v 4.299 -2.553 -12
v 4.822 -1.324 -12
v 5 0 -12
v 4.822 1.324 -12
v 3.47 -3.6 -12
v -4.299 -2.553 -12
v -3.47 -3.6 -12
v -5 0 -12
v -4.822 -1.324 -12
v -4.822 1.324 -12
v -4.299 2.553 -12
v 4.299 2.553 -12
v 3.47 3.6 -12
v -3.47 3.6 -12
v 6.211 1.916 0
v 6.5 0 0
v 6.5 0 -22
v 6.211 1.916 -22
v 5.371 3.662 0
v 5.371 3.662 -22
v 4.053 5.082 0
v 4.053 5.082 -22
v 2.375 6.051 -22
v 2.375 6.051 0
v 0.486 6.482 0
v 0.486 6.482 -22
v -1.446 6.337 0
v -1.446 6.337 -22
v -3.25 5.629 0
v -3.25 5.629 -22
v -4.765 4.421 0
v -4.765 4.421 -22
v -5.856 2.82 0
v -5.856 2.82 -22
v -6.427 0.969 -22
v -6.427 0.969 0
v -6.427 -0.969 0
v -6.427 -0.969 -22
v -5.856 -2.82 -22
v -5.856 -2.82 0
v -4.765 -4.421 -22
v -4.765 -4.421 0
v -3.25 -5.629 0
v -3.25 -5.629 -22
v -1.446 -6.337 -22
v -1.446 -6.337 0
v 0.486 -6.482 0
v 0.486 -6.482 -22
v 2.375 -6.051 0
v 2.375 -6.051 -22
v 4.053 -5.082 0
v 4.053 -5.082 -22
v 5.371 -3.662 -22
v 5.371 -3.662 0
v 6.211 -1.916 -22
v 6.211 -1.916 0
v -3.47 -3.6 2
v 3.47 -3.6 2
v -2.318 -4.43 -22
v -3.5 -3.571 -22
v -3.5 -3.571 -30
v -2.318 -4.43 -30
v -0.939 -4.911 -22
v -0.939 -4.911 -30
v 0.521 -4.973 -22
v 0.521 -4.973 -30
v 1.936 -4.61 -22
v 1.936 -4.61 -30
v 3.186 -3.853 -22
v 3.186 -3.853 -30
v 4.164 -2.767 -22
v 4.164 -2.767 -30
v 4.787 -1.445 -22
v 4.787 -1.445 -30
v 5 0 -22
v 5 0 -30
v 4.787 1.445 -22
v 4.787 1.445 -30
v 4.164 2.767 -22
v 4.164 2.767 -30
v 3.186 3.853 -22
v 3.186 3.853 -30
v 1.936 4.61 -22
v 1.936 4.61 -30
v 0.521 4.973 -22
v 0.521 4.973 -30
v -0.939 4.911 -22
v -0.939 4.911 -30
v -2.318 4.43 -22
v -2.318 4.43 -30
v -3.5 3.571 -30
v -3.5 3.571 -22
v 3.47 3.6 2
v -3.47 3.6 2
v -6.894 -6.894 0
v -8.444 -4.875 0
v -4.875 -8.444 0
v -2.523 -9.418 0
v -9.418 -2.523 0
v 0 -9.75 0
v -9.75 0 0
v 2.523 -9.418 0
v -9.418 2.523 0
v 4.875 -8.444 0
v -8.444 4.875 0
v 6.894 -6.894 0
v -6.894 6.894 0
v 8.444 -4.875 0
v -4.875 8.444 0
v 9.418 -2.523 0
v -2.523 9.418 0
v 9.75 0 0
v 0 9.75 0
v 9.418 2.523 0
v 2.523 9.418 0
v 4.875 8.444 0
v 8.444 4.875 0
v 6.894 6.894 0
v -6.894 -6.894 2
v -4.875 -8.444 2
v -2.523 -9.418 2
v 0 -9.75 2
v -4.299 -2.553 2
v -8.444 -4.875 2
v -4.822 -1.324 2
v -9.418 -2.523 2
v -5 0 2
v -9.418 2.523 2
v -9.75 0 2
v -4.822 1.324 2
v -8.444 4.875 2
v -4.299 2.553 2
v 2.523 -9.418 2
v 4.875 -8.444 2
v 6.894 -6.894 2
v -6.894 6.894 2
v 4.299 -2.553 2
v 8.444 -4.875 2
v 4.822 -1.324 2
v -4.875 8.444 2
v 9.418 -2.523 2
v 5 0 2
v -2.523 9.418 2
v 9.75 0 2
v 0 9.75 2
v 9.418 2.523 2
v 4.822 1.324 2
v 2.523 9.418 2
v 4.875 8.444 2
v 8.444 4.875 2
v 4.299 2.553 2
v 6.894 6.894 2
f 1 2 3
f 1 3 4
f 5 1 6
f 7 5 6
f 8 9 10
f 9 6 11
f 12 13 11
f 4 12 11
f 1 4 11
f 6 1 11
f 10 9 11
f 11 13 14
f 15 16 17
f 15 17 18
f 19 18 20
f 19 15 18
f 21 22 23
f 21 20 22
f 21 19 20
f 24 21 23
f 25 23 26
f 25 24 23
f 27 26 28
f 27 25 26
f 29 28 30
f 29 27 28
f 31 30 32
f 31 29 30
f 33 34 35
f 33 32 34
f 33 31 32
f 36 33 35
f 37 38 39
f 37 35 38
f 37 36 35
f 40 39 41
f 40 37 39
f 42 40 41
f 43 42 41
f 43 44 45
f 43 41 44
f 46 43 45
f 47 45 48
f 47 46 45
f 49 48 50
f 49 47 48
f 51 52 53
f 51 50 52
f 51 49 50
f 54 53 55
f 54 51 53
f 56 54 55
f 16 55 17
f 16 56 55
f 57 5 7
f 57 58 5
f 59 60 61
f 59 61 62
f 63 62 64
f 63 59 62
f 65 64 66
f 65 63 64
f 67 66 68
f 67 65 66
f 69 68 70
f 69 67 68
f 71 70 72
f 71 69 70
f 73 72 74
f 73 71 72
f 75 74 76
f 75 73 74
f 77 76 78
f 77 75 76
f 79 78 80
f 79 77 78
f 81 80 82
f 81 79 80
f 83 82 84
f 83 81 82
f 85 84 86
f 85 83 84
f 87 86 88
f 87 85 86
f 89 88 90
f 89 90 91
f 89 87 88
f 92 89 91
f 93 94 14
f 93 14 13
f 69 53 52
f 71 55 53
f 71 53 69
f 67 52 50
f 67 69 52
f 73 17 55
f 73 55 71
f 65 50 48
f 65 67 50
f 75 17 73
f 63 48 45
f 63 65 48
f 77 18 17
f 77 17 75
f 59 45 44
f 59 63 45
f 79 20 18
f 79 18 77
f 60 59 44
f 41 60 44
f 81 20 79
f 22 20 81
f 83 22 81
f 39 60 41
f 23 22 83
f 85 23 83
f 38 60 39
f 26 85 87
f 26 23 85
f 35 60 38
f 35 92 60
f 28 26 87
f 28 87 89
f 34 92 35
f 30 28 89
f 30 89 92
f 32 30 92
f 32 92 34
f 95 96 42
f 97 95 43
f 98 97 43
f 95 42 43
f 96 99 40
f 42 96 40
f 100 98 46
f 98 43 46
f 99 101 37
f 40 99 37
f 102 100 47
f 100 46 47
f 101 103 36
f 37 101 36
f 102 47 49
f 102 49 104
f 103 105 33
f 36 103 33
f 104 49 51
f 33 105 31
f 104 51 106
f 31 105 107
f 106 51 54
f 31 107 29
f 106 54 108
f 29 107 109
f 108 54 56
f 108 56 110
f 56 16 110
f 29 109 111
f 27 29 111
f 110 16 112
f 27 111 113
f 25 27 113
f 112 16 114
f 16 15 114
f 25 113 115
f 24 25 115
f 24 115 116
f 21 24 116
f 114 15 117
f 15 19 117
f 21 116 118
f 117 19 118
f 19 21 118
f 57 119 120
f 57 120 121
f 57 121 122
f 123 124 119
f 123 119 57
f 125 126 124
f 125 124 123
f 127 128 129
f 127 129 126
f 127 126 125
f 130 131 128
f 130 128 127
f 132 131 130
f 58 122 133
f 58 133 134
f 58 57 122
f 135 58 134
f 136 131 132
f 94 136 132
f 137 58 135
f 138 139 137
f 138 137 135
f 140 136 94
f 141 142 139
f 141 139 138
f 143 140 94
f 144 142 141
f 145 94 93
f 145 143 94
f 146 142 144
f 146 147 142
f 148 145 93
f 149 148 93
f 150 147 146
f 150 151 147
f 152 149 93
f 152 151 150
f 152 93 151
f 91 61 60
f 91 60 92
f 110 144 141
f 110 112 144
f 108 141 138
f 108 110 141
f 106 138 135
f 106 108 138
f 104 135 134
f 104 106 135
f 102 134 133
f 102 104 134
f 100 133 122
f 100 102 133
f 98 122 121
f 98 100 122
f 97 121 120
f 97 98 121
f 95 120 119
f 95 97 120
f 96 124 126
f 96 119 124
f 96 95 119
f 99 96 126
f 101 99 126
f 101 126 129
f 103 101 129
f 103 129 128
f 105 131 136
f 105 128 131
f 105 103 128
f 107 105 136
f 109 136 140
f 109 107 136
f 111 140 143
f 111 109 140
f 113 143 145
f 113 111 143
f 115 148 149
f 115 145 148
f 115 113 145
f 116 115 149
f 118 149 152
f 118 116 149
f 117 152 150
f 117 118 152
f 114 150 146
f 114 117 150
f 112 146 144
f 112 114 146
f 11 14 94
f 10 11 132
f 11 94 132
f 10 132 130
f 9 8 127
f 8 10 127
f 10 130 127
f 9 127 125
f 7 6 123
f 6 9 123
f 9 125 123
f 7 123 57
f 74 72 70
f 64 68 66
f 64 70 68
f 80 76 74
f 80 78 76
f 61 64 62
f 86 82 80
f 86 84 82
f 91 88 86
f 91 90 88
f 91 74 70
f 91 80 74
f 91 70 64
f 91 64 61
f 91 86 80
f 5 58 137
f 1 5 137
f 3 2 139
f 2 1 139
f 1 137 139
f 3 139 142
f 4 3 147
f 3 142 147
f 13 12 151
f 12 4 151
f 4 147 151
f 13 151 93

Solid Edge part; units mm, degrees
sketch "Sketch1" plane through (0, 0, 0) normal (0, 0, 1) x (1, 0, 0)
  circle A0 centre (0, 0) radius 9.75
  dimension "D1" = 19.5
extrude "Protrusion1" add sketch "Sketch1" along normal blind 2
sketch "Sketch2" plane through (0, 0, 0) normal (0, 0, -1) x (1, 0, 0)
  circle A0 centre (0, 0) radius 6.5
  dimension "D1" = 13
extrude "Protrusion2" add sketch "Sketch2" along normal blind 22
sketch "Sketch3" plane through (0, 0, -22) normal (0, 0, -1) x (1, 0, 0)
  line L0 (-3.5, 3.5707) -> (-3.5, -3.5707)
  arc A0 (-3.5, 3.5707) -> (-3.5, -3.5707) centre (0, 0) cw
  dimension "D1" = 10
  dimension "D2" = 3.5
extrude "Protrusion3" add sketch "Sketch3" along normal blind 8
sketch "Sketch4" plane through (0, 0, 2) normal (0, 0, 1) x (1, 0, 0)
  line L0 (-3.4699, 3.6) -> (3.4699, 3.6)
  arc A0 (3.4699, 3.6) -> (3.4699, -3.6) centre (0, 0) cw
  line L1 (3.4699, -3.6) -> (-3.4699, -3.6)
  arc A1 (-3.4699, -3.6) -> (-3.4699, 3.6) centre (0, 0) cw
  dimension "D1" = 5
  dimension "D2" = 3.6
  dimension "D3" = 7.2
extrude "Cutout1" cut sketch "Sketch4" against normal blind 14
properties part number "SHAFT1" material "4140 Steel"
